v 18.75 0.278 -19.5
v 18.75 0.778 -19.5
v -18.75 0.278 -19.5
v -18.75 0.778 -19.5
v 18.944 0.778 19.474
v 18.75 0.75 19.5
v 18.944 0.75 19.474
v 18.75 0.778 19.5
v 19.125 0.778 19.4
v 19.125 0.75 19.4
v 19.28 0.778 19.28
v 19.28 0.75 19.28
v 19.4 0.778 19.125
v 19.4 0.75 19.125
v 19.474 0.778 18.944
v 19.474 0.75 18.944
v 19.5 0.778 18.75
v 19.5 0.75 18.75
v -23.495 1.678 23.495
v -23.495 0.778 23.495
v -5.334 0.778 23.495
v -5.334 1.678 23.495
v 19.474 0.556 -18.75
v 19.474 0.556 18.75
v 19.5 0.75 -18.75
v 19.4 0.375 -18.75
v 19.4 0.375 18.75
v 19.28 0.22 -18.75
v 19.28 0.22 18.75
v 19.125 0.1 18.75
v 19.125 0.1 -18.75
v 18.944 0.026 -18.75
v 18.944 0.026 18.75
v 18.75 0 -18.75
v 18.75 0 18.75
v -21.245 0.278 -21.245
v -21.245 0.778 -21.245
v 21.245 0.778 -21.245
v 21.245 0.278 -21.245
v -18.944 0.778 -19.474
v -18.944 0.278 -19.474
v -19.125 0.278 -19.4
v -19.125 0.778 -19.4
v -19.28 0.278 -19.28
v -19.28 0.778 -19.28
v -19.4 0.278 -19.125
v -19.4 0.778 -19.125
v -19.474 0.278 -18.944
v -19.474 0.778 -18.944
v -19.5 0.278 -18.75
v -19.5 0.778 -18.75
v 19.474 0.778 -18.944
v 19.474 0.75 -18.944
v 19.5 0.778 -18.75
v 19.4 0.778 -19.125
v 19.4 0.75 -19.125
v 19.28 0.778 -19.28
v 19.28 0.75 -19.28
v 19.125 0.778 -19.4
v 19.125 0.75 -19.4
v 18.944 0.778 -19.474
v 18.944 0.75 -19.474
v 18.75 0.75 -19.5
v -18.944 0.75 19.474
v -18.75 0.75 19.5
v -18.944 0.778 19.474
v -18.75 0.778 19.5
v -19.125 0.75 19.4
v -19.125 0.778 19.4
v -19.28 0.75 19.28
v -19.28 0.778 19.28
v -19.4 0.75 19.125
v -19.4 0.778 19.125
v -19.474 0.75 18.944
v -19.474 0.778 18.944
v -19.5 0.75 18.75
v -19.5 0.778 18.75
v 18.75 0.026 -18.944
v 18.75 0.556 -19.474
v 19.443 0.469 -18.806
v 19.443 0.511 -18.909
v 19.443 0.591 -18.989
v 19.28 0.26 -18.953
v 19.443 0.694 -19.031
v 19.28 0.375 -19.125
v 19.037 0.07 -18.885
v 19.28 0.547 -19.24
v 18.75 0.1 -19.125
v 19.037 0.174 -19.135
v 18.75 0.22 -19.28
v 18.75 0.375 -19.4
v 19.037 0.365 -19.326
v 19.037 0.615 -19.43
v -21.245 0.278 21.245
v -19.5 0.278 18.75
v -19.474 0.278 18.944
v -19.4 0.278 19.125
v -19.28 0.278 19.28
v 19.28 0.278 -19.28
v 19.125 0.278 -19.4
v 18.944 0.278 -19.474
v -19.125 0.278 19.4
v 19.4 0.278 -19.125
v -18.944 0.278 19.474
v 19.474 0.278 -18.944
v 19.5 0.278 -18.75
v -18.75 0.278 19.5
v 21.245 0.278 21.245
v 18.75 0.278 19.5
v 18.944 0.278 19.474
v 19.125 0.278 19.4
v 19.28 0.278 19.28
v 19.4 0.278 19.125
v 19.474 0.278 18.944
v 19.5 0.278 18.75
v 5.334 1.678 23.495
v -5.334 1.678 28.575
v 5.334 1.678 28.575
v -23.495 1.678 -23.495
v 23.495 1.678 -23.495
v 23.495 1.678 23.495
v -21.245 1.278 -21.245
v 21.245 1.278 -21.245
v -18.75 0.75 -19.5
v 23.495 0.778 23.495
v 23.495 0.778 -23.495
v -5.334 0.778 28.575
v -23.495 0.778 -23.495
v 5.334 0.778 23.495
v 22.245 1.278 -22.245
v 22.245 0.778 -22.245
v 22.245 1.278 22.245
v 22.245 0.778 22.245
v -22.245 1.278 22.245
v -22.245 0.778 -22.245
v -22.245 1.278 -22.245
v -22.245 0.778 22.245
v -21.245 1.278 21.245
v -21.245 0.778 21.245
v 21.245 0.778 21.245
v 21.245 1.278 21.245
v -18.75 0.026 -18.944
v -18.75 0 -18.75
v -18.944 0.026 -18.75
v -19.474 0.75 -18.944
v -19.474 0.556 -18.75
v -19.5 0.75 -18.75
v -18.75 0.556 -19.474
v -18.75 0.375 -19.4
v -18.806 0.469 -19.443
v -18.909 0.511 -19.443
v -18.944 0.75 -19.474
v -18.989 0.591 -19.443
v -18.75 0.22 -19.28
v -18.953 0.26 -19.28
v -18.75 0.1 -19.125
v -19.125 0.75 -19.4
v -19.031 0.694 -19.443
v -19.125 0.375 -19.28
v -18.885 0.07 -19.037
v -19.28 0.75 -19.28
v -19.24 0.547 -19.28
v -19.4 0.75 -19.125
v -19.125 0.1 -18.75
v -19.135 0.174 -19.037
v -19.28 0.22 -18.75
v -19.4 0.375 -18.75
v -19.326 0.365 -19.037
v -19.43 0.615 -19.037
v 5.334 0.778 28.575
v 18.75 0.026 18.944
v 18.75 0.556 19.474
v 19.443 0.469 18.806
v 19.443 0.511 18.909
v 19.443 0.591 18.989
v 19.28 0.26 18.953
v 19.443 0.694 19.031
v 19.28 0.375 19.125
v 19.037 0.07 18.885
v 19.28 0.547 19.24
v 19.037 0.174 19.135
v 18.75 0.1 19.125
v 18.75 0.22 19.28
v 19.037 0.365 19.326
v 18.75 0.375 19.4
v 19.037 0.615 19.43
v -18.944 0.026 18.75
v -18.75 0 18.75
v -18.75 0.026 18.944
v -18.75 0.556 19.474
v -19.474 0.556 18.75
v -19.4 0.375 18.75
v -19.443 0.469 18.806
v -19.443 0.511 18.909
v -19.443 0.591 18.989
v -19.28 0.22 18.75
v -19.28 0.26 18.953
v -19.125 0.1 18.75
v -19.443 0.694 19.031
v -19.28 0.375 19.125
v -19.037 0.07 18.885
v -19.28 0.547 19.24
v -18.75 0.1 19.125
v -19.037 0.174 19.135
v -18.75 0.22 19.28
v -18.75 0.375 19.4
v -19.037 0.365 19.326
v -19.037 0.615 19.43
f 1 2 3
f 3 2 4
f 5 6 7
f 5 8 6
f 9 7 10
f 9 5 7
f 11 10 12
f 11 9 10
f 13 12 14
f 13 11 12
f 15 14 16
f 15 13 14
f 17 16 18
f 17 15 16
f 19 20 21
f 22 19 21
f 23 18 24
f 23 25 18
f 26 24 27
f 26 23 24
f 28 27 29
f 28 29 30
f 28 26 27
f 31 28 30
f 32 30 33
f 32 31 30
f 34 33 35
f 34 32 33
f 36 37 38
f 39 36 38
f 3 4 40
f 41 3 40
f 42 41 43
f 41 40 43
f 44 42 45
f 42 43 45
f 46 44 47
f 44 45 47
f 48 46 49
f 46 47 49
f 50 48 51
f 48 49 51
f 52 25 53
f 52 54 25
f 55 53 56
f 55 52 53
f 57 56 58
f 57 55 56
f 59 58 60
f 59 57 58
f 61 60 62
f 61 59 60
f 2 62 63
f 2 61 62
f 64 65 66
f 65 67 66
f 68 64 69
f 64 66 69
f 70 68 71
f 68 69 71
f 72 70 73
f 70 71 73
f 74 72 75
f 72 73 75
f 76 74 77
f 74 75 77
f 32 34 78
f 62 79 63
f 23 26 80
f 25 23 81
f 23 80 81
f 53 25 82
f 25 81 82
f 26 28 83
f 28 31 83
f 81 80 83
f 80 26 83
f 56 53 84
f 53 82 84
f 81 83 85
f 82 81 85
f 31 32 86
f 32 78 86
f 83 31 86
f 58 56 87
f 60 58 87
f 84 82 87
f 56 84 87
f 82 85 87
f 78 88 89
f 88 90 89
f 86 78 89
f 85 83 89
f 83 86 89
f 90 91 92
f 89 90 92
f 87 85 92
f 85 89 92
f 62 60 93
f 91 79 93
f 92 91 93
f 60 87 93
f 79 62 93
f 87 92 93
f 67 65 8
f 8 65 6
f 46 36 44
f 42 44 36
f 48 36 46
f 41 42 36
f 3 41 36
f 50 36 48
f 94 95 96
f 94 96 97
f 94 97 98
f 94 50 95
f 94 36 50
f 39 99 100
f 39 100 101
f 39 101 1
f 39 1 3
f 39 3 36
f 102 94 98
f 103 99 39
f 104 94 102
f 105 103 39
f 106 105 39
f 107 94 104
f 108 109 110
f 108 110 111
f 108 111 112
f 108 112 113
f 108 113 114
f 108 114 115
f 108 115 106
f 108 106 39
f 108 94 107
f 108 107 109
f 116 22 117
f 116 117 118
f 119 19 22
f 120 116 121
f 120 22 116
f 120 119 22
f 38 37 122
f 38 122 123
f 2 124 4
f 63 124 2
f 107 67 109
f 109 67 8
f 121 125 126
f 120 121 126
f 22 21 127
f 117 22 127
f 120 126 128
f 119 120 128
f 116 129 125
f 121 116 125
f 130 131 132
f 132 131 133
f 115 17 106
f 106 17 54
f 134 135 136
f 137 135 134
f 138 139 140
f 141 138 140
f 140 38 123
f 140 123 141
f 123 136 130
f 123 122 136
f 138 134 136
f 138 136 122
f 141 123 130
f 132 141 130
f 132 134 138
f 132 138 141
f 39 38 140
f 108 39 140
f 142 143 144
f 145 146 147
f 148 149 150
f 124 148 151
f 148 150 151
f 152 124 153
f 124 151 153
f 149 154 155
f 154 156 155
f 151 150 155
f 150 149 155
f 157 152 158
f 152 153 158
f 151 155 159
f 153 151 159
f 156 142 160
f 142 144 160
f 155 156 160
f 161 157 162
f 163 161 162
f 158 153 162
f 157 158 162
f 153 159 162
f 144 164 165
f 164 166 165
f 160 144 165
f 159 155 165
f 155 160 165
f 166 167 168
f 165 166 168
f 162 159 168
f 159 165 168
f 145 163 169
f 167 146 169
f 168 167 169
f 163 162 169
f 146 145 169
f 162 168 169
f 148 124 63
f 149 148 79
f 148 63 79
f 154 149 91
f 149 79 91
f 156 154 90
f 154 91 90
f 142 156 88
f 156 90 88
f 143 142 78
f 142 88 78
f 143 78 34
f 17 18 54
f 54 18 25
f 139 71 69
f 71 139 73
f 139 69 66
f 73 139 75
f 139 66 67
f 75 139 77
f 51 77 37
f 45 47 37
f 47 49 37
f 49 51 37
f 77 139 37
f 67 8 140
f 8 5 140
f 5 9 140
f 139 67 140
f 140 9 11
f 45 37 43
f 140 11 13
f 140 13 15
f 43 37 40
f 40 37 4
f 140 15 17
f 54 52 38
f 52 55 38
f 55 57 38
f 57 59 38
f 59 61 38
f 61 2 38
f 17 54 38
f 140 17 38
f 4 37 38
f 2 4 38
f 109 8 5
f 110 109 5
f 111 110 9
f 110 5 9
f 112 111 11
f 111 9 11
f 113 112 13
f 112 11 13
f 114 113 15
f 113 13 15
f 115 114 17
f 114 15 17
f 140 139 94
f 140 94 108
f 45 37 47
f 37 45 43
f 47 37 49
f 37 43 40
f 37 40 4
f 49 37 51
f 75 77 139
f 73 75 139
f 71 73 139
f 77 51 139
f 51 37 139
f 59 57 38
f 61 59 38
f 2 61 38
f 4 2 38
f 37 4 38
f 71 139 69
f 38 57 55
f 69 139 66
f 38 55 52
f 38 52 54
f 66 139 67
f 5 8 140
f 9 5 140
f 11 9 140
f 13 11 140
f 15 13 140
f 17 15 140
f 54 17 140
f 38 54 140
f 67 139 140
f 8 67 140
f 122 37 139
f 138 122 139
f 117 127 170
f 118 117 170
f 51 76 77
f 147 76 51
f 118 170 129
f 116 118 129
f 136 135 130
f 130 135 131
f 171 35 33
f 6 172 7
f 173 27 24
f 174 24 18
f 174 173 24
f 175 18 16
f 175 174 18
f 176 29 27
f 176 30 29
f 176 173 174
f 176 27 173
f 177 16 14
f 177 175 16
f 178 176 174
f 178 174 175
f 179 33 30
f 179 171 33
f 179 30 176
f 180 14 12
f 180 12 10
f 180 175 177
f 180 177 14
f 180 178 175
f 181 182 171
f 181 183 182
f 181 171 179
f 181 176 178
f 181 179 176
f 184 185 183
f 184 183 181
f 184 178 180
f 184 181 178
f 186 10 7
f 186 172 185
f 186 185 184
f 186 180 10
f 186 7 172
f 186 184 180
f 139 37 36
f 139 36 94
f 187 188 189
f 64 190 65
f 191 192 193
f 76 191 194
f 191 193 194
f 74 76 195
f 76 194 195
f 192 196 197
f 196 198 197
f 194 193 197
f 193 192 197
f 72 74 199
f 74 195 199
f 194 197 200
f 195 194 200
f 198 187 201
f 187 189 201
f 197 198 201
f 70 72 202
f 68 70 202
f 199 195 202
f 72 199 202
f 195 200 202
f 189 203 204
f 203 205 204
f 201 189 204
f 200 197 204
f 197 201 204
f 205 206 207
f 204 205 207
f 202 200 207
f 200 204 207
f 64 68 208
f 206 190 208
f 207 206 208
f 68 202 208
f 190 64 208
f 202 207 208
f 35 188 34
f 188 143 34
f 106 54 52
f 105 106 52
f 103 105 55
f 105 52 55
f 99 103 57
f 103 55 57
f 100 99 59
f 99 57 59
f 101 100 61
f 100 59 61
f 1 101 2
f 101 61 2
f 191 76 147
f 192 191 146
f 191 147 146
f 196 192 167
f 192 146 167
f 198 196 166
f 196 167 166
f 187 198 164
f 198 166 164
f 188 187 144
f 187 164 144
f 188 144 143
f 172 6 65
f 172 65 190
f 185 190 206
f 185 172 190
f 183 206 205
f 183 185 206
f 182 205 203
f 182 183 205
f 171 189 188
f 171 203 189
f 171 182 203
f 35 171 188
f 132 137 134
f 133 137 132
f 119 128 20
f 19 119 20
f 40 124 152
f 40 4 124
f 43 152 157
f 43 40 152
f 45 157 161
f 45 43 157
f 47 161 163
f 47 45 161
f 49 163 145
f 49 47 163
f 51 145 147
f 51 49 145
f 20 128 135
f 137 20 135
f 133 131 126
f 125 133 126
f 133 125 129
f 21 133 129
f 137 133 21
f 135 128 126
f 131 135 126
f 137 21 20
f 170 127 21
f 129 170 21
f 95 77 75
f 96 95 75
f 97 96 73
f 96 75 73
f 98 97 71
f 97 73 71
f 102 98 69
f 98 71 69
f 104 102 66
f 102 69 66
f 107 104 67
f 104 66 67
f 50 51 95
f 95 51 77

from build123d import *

# Parameters (mm, degrees)
SKETCH1_W           = 39
SKETCH1_H           = 39
BOSS_EXTRUDE1_DEPTH = 0.778
BOSS_EXTRUDE2_DEPTH = 0.9
FILLET1_R           = 0.75
SKETCH3_W           = 44.49
SKETCH3_H           = 44.49
SKETCH3_W_2         = 42.49
SKETCH3_H_2         = 42.49
CUT_EXTRUDE1_DEPTH  = 0.5
SKETCH7_W           = 42.49
SKETCH7_H           = 42.49
BOSS_EXTRUDE5_DEPTH = 0.5


with BuildPart() as part:
    # Sketch1 → Boss-Extrude1 (new body)
    with BuildSketch(Plane(origin=(0, 0, 0), x_dir=(1, 0, 0), z_dir=(0, 1, 0))):
        Rectangle(SKETCH1_W, SKETCH1_H)
    extrude(amount=BOSS_EXTRUDE1_DEPTH)

    # Sketch2 → Boss-Extrude2 (add)
    with BuildSketch(Plane(origin=(0, 0.778, 0), x_dir=(1, 0, 0), z_dir=(0, 1, 0))):
        Polygon((5.334, -23.495), (23.495, -23.495), (23.495, 23.495), (-23.495, 23.495), (-23.495, -23.495), (-5.334, -23.495), (-5.334, -28.575), (5.334, -28.575), align=None)
    extrude(amount=BOSS_EXTRUDE2_DEPTH)

    # Fillet1
    fillet1_edges = [part.edges().sort_by_distance(p)[0] for p in [
        (0, 0, 19.5),
        (-19.5, 0, 0),
        (0, 0, -19.5),
        (19.5, 0, 0),
        (19.5, 0.389, 19.5),
        (-19.5, 0.389, 19.5),
        (-19.5, 0.389, -19.5),
        (19.5, 0.389, -19.5),
    ]]
    fillet(fillet1_edges, radius=FILLET1_R)

    # Sketch3 → Cut-Extrude1 (cut)
    with BuildSketch(Plane.XZ.offset(-0.778)):
        Rectangle(SKETCH3_W, SKETCH3_H)
        Rectangle(SKETCH3_W_2, SKETCH3_H_2, mode=Mode.SUBTRACT)
    extrude(amount=-CUT_EXTRUDE1_DEPTH, mode=Mode.SUBTRACT)


with BuildPart() as body_2:
    # Sketch7 → Boss-Extrude5 (new body)
    with BuildSketch(Plane.XZ.offset(-0.778)):
        Rectangle(SKETCH7_W, SKETCH7_H)
        with BuildLine():
            Line((-18.75, 19.5), (18.75, 19.5))
            ThreePointArc((18.75, 19.5), (19.280330086, 19.280330086), (19.5, 18.75))
            Line((19.5, 18.75), (19.5, -18.75))
            ThreePointArc((19.5, -18.75), (19.280330086, -19.280330086), (18.75, -19.5))
            Line((18.75, -19.5), (-18.75, -19.5))
            ThreePointArc((-18.75, -19.5), (-19.280330086, -19.280330086), (-19.5, -18.75))
            Line((-19.5, -18.75), (-19.5, 18.75))
            ThreePointArc((-19.5, 18.75), (-19.280330086, 19.280330086), (-18.75, 19.5))
        make_face(mode=Mode.SUBTRACT)
    extrude(amount=BOSS_EXTRUDE5_DEPTH)


solid = Compound([part.part, body_2.part])
